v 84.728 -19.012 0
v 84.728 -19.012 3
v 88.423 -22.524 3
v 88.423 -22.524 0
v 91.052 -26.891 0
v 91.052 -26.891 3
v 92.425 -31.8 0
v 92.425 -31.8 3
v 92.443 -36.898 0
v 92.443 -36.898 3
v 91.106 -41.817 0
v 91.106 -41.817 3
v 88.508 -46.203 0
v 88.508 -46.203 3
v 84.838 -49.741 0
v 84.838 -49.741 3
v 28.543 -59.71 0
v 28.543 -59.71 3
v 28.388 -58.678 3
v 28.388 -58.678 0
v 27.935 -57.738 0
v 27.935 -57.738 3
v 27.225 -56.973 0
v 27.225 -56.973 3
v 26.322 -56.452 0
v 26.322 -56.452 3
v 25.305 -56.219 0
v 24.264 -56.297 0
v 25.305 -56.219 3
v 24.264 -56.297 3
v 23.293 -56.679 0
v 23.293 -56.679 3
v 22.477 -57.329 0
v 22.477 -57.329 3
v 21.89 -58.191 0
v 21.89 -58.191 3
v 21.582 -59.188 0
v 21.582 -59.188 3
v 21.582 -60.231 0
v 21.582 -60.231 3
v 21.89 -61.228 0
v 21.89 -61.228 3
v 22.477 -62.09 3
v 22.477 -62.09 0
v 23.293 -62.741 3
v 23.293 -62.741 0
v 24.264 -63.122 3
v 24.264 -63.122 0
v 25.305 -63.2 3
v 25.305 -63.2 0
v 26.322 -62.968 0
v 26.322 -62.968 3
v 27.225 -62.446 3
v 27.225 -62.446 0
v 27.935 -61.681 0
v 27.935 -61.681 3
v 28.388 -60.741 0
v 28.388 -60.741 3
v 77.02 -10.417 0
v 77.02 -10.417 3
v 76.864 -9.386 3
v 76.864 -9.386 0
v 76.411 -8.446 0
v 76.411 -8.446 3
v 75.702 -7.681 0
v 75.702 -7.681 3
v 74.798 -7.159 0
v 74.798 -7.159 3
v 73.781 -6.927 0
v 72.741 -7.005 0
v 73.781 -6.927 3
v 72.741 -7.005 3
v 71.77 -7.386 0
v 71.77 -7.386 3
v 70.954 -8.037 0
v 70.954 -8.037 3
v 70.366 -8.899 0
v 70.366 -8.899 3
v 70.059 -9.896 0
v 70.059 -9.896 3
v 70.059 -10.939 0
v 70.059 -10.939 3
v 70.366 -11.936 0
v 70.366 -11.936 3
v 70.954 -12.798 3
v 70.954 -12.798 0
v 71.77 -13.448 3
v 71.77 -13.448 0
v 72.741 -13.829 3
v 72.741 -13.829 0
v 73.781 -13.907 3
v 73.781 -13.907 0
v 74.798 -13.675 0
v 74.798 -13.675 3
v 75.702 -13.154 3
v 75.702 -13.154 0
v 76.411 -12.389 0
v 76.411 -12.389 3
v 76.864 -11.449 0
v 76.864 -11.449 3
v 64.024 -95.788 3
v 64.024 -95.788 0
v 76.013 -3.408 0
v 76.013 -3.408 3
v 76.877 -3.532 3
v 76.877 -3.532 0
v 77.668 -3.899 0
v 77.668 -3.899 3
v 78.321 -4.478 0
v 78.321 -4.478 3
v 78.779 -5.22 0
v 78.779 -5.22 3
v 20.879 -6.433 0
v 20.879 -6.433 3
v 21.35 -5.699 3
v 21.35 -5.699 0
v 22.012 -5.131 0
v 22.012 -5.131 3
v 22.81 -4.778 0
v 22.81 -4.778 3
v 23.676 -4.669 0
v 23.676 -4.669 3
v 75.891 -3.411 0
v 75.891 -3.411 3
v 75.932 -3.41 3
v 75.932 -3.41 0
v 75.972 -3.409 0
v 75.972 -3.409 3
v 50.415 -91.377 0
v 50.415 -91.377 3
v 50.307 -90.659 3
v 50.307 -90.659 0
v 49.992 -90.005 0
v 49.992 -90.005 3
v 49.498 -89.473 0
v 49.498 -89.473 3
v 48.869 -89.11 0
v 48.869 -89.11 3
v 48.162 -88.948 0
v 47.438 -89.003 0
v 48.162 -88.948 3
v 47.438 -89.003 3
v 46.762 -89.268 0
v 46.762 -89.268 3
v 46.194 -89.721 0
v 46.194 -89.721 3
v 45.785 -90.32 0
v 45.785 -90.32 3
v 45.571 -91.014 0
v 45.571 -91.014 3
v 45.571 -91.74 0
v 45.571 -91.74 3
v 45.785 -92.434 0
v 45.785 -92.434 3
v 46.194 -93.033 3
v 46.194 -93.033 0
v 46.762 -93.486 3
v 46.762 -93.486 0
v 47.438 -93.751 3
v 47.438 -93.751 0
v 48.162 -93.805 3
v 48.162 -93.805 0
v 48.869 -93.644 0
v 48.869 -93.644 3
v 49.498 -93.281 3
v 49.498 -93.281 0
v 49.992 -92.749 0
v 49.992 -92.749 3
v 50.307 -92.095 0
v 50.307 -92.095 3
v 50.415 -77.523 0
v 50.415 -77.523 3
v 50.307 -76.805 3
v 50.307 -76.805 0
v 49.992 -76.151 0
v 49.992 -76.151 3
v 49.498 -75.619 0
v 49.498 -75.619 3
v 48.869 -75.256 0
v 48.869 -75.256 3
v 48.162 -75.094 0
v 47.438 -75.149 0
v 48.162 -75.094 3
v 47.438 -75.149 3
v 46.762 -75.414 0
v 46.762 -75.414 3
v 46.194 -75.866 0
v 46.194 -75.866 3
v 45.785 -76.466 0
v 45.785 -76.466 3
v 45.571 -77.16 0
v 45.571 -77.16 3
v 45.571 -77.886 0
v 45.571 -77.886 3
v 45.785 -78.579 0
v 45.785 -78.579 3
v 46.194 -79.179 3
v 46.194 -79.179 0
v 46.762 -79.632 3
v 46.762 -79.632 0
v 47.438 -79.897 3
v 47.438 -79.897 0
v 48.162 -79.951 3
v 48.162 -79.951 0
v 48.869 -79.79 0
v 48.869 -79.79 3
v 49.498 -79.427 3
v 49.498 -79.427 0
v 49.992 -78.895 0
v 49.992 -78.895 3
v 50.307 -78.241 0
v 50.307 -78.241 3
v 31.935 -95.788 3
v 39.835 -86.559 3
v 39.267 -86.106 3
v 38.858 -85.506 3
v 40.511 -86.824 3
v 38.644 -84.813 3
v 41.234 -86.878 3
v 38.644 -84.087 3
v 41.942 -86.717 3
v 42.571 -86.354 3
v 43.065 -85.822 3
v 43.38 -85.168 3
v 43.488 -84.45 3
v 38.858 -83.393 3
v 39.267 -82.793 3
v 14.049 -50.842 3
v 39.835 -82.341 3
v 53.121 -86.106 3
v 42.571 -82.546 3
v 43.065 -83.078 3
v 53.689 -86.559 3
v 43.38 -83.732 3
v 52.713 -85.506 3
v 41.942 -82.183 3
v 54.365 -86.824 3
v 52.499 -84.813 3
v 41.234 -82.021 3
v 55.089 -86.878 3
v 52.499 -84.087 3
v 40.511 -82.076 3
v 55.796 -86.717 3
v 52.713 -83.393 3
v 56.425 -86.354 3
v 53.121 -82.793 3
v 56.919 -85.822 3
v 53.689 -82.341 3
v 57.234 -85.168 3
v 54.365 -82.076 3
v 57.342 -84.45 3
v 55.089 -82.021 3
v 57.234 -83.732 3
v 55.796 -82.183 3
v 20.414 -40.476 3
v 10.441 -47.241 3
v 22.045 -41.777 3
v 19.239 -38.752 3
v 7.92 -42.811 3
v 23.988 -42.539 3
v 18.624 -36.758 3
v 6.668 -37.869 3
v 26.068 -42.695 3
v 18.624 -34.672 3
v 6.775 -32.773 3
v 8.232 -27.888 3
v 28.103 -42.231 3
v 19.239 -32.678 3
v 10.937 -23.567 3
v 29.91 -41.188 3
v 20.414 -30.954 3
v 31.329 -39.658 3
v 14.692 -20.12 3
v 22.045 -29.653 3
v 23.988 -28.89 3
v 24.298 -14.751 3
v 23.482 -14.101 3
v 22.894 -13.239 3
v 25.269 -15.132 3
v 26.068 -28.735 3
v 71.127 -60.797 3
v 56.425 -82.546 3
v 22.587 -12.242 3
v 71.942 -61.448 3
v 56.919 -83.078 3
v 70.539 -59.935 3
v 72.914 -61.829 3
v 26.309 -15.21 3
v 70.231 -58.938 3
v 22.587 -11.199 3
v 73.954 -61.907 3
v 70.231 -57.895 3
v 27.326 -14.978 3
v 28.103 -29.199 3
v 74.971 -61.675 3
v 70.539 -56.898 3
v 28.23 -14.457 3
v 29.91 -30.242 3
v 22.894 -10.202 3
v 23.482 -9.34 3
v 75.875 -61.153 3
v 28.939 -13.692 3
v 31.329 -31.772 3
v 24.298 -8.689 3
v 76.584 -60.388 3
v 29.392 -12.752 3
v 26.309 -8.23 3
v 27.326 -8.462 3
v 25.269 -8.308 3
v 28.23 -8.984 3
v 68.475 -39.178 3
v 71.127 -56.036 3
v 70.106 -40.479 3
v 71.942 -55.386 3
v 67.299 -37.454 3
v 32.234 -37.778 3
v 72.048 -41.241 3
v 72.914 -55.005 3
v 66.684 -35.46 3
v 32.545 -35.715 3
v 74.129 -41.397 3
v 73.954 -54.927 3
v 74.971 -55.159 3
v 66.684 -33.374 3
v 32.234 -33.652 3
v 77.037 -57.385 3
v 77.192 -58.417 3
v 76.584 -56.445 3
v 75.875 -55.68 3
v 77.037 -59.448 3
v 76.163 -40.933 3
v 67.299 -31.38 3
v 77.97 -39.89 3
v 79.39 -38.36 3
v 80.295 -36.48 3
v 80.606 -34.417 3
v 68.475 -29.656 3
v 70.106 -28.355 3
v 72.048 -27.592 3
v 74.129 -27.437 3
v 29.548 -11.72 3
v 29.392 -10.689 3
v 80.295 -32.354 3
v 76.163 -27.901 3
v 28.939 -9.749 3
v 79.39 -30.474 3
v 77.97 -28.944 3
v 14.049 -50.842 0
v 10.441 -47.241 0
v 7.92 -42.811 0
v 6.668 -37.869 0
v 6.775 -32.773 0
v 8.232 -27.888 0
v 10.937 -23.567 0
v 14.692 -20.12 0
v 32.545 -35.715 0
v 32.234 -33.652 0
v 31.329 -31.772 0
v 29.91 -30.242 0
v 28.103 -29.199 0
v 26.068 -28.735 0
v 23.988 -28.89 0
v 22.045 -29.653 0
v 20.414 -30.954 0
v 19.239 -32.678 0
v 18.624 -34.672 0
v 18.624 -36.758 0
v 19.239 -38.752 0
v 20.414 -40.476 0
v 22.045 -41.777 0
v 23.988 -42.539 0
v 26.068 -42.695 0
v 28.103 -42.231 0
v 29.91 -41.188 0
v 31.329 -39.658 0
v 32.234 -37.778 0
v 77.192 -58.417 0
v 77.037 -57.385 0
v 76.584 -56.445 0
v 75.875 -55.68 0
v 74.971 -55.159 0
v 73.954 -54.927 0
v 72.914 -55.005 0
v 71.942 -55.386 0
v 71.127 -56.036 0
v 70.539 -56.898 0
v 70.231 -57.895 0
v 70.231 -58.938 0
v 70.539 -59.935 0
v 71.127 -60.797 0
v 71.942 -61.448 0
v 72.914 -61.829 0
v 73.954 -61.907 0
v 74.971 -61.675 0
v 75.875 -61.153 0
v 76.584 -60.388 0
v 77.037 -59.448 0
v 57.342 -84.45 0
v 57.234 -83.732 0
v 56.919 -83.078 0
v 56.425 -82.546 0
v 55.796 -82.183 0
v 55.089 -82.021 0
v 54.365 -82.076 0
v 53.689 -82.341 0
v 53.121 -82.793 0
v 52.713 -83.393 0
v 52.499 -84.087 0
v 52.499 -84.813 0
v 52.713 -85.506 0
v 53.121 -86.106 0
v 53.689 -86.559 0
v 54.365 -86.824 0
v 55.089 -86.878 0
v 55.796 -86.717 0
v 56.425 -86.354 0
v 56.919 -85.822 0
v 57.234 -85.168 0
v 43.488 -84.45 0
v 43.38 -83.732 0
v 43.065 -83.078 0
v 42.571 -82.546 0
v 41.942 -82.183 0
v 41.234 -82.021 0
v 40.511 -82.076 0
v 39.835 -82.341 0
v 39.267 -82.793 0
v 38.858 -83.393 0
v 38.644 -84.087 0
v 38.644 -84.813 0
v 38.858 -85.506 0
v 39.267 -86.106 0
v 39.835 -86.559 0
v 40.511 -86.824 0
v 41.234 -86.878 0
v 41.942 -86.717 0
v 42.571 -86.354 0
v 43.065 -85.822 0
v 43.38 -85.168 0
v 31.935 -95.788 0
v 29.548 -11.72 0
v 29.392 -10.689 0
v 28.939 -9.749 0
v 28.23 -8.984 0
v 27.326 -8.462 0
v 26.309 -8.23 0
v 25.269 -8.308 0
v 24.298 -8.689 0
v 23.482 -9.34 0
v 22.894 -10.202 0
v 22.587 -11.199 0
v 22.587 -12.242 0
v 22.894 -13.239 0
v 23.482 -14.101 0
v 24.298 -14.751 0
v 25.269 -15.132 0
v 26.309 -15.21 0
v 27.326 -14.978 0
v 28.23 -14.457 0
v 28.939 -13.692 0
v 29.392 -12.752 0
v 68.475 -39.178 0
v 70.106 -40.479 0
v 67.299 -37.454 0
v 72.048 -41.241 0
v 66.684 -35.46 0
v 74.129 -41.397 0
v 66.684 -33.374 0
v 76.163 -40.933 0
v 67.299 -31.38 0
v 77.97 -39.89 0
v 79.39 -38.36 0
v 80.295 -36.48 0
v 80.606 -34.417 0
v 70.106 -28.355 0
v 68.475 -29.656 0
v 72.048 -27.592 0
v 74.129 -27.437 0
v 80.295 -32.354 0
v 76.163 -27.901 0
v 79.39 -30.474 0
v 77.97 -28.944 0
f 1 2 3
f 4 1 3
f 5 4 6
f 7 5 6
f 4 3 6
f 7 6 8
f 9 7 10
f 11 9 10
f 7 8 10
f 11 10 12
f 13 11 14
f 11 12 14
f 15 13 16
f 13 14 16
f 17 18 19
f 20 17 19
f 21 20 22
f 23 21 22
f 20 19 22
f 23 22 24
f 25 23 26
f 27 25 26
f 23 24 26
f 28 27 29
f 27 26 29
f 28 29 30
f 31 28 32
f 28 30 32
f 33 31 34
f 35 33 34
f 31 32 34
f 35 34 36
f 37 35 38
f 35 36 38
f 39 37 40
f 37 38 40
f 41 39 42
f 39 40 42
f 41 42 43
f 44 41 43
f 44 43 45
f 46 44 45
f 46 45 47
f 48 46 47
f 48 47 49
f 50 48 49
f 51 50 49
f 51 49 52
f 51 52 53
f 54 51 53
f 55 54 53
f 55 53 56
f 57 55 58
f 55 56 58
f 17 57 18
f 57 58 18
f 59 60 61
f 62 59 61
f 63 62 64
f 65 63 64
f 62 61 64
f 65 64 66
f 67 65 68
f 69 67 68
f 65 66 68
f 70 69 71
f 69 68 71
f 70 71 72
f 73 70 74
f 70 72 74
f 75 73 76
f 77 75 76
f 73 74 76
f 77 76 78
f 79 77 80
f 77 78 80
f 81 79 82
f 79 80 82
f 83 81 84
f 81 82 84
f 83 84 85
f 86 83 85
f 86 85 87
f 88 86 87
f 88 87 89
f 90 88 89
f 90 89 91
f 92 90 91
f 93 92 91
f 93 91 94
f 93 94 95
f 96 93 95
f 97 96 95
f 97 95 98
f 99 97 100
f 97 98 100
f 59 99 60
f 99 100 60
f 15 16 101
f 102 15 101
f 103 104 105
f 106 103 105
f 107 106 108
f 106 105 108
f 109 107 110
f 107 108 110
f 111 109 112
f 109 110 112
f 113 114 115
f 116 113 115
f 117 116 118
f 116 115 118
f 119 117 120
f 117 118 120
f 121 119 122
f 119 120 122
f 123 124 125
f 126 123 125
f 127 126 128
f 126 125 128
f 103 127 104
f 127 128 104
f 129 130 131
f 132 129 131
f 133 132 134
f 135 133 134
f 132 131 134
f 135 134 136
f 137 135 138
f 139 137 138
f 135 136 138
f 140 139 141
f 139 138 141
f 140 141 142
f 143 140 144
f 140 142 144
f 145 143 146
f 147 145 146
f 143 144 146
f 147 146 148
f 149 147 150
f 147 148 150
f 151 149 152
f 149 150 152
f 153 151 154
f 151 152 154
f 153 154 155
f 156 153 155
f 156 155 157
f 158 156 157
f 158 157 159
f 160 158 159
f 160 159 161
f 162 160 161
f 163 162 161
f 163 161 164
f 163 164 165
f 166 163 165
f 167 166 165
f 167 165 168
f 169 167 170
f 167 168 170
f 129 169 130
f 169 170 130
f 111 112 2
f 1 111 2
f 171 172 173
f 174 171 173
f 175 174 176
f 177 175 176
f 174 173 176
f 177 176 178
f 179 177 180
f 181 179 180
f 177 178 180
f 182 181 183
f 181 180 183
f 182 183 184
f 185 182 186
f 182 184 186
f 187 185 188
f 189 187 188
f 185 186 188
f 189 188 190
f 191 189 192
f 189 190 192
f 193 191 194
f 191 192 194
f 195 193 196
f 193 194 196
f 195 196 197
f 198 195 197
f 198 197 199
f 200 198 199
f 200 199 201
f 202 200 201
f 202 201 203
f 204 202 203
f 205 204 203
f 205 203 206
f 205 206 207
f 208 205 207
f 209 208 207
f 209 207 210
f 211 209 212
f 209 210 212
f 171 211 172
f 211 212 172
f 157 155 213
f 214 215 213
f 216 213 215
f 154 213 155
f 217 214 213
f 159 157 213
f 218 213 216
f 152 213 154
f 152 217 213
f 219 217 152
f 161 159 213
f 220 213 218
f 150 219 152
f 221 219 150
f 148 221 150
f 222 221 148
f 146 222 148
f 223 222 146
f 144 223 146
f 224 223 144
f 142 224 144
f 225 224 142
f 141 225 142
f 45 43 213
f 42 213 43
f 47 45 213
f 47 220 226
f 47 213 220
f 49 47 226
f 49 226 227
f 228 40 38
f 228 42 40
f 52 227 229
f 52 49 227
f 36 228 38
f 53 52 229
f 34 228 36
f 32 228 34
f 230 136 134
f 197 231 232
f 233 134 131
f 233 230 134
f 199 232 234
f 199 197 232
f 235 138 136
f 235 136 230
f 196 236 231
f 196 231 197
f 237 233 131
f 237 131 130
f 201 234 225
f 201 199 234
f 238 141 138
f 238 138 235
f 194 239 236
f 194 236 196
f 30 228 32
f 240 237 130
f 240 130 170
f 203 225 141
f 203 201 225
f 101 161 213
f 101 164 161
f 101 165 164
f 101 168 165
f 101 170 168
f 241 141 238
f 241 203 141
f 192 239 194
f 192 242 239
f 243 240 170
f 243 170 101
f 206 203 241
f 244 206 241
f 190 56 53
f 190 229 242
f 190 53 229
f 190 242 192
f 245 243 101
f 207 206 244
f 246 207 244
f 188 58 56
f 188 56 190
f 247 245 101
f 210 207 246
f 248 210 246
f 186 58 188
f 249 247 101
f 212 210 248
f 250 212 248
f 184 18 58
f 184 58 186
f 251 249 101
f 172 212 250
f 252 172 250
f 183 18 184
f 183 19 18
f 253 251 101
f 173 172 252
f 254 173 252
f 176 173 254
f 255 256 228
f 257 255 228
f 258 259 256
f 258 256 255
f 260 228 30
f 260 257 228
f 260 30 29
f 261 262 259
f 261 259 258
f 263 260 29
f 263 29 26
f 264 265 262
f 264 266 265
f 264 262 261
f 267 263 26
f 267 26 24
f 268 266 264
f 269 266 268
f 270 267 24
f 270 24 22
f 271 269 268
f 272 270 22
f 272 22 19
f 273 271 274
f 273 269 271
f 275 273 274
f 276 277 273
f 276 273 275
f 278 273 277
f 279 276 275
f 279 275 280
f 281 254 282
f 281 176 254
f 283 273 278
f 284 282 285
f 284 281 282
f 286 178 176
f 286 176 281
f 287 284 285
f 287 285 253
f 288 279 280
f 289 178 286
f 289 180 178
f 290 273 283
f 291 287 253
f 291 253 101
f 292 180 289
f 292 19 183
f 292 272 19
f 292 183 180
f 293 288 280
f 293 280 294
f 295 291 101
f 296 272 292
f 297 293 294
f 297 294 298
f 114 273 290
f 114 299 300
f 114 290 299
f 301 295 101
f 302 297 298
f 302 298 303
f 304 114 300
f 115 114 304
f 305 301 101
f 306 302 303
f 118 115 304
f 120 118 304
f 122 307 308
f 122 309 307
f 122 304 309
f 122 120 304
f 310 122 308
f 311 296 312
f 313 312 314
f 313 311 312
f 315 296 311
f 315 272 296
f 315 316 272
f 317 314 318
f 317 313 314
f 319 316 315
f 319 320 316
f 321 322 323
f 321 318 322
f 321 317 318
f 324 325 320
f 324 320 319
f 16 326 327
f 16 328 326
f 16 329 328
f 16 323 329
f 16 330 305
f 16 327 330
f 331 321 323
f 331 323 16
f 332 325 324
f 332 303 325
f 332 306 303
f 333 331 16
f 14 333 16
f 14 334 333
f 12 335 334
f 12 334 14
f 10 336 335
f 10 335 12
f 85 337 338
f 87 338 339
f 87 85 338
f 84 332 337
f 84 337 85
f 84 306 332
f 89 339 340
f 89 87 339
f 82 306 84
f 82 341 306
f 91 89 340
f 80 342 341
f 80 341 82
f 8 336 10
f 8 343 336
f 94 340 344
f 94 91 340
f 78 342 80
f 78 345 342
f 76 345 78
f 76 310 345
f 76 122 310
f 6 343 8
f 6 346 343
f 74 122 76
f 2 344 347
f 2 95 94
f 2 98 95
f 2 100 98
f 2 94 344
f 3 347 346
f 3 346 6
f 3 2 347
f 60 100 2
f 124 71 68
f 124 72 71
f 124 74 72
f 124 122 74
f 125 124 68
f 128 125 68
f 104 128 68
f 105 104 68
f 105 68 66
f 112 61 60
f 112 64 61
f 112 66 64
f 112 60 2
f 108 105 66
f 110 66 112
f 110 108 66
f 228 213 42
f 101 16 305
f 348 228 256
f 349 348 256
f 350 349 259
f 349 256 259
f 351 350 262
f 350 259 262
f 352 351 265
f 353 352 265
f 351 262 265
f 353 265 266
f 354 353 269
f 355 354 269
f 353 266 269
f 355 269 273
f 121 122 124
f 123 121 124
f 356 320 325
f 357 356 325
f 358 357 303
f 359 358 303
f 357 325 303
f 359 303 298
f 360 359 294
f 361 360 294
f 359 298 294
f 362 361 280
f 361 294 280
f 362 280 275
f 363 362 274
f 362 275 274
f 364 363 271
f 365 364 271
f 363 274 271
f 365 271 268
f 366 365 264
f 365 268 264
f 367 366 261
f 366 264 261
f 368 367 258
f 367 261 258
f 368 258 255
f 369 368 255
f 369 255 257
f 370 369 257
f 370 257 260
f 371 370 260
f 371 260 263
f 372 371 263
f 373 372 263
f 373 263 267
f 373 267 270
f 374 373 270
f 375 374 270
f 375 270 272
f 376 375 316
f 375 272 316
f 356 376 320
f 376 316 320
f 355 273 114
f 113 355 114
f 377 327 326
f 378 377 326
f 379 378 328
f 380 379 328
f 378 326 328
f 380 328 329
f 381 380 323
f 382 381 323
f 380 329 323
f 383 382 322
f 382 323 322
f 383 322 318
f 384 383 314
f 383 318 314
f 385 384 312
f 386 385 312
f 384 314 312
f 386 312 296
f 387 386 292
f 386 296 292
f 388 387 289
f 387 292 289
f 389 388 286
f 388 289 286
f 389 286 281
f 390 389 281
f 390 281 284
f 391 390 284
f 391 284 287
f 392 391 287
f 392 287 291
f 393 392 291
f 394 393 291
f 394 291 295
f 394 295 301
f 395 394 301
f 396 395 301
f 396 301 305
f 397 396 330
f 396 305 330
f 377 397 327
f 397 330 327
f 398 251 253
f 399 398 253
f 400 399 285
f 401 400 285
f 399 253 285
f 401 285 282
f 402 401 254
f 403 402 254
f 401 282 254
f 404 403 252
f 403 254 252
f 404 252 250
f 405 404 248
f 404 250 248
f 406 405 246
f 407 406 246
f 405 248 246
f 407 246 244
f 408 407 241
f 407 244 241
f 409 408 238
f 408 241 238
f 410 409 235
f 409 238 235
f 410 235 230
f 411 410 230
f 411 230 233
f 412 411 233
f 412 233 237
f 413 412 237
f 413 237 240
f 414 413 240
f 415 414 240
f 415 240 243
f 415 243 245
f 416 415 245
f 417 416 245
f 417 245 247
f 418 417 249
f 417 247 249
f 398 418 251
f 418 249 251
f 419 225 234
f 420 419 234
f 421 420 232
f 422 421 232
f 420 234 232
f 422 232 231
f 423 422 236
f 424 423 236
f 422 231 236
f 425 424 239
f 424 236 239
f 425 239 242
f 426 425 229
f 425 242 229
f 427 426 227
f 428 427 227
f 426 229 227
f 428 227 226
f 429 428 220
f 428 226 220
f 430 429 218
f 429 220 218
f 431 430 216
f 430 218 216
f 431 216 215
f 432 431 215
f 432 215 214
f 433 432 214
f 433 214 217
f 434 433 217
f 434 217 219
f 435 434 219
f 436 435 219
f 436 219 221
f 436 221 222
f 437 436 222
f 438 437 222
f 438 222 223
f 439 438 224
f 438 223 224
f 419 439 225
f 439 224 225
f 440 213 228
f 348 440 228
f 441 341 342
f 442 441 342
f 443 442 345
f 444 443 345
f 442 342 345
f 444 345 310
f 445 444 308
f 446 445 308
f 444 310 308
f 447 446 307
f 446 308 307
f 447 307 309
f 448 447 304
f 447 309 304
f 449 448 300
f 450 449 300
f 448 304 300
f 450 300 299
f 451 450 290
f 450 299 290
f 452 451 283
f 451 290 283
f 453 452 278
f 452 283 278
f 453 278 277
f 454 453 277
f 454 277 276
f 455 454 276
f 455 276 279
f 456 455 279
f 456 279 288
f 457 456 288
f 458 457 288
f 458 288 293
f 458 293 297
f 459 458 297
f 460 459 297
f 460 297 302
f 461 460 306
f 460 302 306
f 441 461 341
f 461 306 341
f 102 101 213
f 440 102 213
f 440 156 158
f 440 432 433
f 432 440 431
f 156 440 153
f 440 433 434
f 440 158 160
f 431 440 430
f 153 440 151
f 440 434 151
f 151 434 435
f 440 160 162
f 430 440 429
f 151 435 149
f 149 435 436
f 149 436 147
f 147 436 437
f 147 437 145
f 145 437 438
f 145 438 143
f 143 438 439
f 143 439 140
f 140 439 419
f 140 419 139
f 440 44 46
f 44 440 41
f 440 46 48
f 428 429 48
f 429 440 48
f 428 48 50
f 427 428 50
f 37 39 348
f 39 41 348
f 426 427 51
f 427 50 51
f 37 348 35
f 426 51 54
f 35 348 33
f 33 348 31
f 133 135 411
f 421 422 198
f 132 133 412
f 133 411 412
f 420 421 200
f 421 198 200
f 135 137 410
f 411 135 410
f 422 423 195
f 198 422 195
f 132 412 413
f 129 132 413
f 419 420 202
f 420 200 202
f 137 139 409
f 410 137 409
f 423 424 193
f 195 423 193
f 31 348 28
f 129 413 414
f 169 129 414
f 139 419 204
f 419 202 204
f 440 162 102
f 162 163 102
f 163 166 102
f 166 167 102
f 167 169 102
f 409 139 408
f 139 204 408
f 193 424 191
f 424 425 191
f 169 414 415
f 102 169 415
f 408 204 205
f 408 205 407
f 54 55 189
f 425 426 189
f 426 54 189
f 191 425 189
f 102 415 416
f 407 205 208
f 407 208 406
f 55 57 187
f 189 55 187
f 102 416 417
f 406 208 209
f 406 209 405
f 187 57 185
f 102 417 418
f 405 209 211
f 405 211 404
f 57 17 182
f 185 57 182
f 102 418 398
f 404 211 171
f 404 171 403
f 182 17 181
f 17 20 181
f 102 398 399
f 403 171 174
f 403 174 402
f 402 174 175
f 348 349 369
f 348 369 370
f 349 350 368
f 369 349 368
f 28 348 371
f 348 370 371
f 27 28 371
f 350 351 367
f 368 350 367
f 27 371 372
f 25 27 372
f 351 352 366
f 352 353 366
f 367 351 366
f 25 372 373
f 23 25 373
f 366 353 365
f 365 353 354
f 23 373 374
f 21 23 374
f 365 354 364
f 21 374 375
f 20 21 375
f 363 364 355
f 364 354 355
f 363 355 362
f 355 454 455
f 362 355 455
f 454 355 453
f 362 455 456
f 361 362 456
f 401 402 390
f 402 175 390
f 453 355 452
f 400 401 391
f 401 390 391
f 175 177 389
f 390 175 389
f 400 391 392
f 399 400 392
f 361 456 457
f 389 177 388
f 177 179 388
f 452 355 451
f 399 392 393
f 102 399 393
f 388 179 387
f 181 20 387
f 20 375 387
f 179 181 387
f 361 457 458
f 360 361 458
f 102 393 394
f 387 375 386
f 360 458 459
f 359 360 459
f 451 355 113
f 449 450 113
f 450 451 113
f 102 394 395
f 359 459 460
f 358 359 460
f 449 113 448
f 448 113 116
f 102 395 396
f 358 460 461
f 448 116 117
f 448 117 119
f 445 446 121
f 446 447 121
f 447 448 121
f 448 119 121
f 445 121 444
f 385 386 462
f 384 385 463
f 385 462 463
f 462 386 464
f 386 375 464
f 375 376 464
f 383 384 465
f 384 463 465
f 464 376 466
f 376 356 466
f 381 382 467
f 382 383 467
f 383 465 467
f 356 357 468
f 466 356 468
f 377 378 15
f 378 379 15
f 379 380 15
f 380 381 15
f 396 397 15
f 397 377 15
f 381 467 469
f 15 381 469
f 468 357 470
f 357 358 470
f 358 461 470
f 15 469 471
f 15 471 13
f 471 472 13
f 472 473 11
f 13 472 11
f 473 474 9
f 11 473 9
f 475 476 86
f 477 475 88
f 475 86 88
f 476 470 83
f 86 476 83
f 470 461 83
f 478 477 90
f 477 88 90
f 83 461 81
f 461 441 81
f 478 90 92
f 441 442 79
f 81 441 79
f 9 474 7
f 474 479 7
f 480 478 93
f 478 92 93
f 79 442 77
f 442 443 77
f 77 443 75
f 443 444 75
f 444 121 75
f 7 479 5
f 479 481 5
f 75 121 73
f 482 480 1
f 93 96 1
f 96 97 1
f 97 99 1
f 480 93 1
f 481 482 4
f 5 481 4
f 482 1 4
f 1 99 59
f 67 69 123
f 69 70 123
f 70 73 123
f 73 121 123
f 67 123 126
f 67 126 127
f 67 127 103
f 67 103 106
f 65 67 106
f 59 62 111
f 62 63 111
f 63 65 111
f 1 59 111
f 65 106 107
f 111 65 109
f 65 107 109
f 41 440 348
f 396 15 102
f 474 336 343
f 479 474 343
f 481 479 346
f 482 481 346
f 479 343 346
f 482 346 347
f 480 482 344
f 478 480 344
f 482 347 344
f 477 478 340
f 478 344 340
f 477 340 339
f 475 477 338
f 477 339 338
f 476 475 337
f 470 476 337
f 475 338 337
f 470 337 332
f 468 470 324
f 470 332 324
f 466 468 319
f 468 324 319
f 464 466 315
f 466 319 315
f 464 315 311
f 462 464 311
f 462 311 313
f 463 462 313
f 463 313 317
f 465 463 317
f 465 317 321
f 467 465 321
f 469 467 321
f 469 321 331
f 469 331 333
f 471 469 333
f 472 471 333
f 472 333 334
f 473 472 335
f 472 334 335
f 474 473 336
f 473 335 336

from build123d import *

# Parameters (mm, degrees)
SKETCH1_W           = 95
SKETCH1_H           = 100
BOSS_EXTRUDE1_DEPTH = 3
CUT_EXTRUDE3_DEPTH  = 3
SKETCH5_R           = 2.43527257
SKETCH5_R_2         = 7
SKETCH5_R_3         = 3.5
CUT_EXTRUDE4_DEPTH  = 3


with BuildPart() as part:
    # Sketch1 → Boss-Extrude1 (new body)
    with BuildSketch(Plane.XY):
        with Locations((47.5, -50)):
            Rectangle(SKETCH1_W, SKETCH1_H)
    extrude(amount=BOSS_EXTRUDE1_DEPTH)

    # Sketch4 → Cut-Extrude3 (cut)
    with BuildSketch(Plane.XY.offset(3)):
        Polygon((33.610991992, -100), (62.120295215, -100), (95, -100), (95, 0), (0, 0), (0, -100), align=None)
        with BuildLine():
            Line((78.778954762, -5.219976488), (84.72769663, -19.012180272))
            ThreePointArc((84.72769663, -19.012180272), (92.605897001, -34.348605074), (84.838305738, -49.741346636))
            Line((84.838305738, -49.741346636), (64.0242126, -95.787997202))
            Line((64.0242126, -95.787997202), (31.934866328, -95.787997202))
            Line((31.934866328, -95.787997202), (14.049192276, -50.842376041))
            ThreePointArc((14.049192276, -50.842376041), (6.549499619, -35.317345386), (14.692273517, -20.119740309))
            Line((14.692273517, -20.119740309), (20.879119665, -6.432689868))
            ThreePointArc((20.879119665, -6.432689868), (22.012480764, -5.130871888), (23.675593701, -4.669035561))
            Line((23.675593701, -4.669035561), (75.890580945, -3.41108885))
            ThreePointArc((75.890580945, -3.41108885), (75.952006311, -3.408979239), (76.013462004, -3.408128439))
            ThreePointArc((76.013462004, -3.408128439), (77.66832232, -3.898714586), (78.778954762, -5.219976488))
        make_face(mode=Mode.SUBTRACT)
    extrude(amount=-CUT_EXTRUDE3_DEPTH, mode=Mode.SUBTRACT)

    # Sketch5 → Cut-Extrude4 (cut)
    with BuildSketch(Plane.XY.offset(3)):
        with Locations((54.906624154, -84.449867327)):
            Circle(SKETCH5_R)
        with Locations((47.979539464, -91.376952018)):
            Circle(SKETCH5_R)
        with Locations((41.052454773, -84.449867327)):
            Circle(SKETCH5_R)
        with Locations((47.979539464, -77.522782636)):
            Circle(SKETCH5_R)
        with Locations((73.606020085, -34.416994806)):
            Circle(SKETCH5_R_2)
        with Locations((25.545338638, -35.714963215)):
            Circle(SKETCH5_R_2)
        with Locations((25.043084538, -59.70970724)):
            Circle(SKETCH5_R_3)
        with Locations((26.047592738, -11.72021919)):
            Circle(SKETCH5_R_3)
        with Locations((73.692407115, -58.416839333)):
            Circle(SKETCH5_R_3)
        with Locations((73.519633055, -10.41715028)):
            Circle(SKETCH5_R_3)
    extrude(amount=-CUT_EXTRUDE4_DEPTH, mode=Mode.SUBTRACT)


solid = part.part
